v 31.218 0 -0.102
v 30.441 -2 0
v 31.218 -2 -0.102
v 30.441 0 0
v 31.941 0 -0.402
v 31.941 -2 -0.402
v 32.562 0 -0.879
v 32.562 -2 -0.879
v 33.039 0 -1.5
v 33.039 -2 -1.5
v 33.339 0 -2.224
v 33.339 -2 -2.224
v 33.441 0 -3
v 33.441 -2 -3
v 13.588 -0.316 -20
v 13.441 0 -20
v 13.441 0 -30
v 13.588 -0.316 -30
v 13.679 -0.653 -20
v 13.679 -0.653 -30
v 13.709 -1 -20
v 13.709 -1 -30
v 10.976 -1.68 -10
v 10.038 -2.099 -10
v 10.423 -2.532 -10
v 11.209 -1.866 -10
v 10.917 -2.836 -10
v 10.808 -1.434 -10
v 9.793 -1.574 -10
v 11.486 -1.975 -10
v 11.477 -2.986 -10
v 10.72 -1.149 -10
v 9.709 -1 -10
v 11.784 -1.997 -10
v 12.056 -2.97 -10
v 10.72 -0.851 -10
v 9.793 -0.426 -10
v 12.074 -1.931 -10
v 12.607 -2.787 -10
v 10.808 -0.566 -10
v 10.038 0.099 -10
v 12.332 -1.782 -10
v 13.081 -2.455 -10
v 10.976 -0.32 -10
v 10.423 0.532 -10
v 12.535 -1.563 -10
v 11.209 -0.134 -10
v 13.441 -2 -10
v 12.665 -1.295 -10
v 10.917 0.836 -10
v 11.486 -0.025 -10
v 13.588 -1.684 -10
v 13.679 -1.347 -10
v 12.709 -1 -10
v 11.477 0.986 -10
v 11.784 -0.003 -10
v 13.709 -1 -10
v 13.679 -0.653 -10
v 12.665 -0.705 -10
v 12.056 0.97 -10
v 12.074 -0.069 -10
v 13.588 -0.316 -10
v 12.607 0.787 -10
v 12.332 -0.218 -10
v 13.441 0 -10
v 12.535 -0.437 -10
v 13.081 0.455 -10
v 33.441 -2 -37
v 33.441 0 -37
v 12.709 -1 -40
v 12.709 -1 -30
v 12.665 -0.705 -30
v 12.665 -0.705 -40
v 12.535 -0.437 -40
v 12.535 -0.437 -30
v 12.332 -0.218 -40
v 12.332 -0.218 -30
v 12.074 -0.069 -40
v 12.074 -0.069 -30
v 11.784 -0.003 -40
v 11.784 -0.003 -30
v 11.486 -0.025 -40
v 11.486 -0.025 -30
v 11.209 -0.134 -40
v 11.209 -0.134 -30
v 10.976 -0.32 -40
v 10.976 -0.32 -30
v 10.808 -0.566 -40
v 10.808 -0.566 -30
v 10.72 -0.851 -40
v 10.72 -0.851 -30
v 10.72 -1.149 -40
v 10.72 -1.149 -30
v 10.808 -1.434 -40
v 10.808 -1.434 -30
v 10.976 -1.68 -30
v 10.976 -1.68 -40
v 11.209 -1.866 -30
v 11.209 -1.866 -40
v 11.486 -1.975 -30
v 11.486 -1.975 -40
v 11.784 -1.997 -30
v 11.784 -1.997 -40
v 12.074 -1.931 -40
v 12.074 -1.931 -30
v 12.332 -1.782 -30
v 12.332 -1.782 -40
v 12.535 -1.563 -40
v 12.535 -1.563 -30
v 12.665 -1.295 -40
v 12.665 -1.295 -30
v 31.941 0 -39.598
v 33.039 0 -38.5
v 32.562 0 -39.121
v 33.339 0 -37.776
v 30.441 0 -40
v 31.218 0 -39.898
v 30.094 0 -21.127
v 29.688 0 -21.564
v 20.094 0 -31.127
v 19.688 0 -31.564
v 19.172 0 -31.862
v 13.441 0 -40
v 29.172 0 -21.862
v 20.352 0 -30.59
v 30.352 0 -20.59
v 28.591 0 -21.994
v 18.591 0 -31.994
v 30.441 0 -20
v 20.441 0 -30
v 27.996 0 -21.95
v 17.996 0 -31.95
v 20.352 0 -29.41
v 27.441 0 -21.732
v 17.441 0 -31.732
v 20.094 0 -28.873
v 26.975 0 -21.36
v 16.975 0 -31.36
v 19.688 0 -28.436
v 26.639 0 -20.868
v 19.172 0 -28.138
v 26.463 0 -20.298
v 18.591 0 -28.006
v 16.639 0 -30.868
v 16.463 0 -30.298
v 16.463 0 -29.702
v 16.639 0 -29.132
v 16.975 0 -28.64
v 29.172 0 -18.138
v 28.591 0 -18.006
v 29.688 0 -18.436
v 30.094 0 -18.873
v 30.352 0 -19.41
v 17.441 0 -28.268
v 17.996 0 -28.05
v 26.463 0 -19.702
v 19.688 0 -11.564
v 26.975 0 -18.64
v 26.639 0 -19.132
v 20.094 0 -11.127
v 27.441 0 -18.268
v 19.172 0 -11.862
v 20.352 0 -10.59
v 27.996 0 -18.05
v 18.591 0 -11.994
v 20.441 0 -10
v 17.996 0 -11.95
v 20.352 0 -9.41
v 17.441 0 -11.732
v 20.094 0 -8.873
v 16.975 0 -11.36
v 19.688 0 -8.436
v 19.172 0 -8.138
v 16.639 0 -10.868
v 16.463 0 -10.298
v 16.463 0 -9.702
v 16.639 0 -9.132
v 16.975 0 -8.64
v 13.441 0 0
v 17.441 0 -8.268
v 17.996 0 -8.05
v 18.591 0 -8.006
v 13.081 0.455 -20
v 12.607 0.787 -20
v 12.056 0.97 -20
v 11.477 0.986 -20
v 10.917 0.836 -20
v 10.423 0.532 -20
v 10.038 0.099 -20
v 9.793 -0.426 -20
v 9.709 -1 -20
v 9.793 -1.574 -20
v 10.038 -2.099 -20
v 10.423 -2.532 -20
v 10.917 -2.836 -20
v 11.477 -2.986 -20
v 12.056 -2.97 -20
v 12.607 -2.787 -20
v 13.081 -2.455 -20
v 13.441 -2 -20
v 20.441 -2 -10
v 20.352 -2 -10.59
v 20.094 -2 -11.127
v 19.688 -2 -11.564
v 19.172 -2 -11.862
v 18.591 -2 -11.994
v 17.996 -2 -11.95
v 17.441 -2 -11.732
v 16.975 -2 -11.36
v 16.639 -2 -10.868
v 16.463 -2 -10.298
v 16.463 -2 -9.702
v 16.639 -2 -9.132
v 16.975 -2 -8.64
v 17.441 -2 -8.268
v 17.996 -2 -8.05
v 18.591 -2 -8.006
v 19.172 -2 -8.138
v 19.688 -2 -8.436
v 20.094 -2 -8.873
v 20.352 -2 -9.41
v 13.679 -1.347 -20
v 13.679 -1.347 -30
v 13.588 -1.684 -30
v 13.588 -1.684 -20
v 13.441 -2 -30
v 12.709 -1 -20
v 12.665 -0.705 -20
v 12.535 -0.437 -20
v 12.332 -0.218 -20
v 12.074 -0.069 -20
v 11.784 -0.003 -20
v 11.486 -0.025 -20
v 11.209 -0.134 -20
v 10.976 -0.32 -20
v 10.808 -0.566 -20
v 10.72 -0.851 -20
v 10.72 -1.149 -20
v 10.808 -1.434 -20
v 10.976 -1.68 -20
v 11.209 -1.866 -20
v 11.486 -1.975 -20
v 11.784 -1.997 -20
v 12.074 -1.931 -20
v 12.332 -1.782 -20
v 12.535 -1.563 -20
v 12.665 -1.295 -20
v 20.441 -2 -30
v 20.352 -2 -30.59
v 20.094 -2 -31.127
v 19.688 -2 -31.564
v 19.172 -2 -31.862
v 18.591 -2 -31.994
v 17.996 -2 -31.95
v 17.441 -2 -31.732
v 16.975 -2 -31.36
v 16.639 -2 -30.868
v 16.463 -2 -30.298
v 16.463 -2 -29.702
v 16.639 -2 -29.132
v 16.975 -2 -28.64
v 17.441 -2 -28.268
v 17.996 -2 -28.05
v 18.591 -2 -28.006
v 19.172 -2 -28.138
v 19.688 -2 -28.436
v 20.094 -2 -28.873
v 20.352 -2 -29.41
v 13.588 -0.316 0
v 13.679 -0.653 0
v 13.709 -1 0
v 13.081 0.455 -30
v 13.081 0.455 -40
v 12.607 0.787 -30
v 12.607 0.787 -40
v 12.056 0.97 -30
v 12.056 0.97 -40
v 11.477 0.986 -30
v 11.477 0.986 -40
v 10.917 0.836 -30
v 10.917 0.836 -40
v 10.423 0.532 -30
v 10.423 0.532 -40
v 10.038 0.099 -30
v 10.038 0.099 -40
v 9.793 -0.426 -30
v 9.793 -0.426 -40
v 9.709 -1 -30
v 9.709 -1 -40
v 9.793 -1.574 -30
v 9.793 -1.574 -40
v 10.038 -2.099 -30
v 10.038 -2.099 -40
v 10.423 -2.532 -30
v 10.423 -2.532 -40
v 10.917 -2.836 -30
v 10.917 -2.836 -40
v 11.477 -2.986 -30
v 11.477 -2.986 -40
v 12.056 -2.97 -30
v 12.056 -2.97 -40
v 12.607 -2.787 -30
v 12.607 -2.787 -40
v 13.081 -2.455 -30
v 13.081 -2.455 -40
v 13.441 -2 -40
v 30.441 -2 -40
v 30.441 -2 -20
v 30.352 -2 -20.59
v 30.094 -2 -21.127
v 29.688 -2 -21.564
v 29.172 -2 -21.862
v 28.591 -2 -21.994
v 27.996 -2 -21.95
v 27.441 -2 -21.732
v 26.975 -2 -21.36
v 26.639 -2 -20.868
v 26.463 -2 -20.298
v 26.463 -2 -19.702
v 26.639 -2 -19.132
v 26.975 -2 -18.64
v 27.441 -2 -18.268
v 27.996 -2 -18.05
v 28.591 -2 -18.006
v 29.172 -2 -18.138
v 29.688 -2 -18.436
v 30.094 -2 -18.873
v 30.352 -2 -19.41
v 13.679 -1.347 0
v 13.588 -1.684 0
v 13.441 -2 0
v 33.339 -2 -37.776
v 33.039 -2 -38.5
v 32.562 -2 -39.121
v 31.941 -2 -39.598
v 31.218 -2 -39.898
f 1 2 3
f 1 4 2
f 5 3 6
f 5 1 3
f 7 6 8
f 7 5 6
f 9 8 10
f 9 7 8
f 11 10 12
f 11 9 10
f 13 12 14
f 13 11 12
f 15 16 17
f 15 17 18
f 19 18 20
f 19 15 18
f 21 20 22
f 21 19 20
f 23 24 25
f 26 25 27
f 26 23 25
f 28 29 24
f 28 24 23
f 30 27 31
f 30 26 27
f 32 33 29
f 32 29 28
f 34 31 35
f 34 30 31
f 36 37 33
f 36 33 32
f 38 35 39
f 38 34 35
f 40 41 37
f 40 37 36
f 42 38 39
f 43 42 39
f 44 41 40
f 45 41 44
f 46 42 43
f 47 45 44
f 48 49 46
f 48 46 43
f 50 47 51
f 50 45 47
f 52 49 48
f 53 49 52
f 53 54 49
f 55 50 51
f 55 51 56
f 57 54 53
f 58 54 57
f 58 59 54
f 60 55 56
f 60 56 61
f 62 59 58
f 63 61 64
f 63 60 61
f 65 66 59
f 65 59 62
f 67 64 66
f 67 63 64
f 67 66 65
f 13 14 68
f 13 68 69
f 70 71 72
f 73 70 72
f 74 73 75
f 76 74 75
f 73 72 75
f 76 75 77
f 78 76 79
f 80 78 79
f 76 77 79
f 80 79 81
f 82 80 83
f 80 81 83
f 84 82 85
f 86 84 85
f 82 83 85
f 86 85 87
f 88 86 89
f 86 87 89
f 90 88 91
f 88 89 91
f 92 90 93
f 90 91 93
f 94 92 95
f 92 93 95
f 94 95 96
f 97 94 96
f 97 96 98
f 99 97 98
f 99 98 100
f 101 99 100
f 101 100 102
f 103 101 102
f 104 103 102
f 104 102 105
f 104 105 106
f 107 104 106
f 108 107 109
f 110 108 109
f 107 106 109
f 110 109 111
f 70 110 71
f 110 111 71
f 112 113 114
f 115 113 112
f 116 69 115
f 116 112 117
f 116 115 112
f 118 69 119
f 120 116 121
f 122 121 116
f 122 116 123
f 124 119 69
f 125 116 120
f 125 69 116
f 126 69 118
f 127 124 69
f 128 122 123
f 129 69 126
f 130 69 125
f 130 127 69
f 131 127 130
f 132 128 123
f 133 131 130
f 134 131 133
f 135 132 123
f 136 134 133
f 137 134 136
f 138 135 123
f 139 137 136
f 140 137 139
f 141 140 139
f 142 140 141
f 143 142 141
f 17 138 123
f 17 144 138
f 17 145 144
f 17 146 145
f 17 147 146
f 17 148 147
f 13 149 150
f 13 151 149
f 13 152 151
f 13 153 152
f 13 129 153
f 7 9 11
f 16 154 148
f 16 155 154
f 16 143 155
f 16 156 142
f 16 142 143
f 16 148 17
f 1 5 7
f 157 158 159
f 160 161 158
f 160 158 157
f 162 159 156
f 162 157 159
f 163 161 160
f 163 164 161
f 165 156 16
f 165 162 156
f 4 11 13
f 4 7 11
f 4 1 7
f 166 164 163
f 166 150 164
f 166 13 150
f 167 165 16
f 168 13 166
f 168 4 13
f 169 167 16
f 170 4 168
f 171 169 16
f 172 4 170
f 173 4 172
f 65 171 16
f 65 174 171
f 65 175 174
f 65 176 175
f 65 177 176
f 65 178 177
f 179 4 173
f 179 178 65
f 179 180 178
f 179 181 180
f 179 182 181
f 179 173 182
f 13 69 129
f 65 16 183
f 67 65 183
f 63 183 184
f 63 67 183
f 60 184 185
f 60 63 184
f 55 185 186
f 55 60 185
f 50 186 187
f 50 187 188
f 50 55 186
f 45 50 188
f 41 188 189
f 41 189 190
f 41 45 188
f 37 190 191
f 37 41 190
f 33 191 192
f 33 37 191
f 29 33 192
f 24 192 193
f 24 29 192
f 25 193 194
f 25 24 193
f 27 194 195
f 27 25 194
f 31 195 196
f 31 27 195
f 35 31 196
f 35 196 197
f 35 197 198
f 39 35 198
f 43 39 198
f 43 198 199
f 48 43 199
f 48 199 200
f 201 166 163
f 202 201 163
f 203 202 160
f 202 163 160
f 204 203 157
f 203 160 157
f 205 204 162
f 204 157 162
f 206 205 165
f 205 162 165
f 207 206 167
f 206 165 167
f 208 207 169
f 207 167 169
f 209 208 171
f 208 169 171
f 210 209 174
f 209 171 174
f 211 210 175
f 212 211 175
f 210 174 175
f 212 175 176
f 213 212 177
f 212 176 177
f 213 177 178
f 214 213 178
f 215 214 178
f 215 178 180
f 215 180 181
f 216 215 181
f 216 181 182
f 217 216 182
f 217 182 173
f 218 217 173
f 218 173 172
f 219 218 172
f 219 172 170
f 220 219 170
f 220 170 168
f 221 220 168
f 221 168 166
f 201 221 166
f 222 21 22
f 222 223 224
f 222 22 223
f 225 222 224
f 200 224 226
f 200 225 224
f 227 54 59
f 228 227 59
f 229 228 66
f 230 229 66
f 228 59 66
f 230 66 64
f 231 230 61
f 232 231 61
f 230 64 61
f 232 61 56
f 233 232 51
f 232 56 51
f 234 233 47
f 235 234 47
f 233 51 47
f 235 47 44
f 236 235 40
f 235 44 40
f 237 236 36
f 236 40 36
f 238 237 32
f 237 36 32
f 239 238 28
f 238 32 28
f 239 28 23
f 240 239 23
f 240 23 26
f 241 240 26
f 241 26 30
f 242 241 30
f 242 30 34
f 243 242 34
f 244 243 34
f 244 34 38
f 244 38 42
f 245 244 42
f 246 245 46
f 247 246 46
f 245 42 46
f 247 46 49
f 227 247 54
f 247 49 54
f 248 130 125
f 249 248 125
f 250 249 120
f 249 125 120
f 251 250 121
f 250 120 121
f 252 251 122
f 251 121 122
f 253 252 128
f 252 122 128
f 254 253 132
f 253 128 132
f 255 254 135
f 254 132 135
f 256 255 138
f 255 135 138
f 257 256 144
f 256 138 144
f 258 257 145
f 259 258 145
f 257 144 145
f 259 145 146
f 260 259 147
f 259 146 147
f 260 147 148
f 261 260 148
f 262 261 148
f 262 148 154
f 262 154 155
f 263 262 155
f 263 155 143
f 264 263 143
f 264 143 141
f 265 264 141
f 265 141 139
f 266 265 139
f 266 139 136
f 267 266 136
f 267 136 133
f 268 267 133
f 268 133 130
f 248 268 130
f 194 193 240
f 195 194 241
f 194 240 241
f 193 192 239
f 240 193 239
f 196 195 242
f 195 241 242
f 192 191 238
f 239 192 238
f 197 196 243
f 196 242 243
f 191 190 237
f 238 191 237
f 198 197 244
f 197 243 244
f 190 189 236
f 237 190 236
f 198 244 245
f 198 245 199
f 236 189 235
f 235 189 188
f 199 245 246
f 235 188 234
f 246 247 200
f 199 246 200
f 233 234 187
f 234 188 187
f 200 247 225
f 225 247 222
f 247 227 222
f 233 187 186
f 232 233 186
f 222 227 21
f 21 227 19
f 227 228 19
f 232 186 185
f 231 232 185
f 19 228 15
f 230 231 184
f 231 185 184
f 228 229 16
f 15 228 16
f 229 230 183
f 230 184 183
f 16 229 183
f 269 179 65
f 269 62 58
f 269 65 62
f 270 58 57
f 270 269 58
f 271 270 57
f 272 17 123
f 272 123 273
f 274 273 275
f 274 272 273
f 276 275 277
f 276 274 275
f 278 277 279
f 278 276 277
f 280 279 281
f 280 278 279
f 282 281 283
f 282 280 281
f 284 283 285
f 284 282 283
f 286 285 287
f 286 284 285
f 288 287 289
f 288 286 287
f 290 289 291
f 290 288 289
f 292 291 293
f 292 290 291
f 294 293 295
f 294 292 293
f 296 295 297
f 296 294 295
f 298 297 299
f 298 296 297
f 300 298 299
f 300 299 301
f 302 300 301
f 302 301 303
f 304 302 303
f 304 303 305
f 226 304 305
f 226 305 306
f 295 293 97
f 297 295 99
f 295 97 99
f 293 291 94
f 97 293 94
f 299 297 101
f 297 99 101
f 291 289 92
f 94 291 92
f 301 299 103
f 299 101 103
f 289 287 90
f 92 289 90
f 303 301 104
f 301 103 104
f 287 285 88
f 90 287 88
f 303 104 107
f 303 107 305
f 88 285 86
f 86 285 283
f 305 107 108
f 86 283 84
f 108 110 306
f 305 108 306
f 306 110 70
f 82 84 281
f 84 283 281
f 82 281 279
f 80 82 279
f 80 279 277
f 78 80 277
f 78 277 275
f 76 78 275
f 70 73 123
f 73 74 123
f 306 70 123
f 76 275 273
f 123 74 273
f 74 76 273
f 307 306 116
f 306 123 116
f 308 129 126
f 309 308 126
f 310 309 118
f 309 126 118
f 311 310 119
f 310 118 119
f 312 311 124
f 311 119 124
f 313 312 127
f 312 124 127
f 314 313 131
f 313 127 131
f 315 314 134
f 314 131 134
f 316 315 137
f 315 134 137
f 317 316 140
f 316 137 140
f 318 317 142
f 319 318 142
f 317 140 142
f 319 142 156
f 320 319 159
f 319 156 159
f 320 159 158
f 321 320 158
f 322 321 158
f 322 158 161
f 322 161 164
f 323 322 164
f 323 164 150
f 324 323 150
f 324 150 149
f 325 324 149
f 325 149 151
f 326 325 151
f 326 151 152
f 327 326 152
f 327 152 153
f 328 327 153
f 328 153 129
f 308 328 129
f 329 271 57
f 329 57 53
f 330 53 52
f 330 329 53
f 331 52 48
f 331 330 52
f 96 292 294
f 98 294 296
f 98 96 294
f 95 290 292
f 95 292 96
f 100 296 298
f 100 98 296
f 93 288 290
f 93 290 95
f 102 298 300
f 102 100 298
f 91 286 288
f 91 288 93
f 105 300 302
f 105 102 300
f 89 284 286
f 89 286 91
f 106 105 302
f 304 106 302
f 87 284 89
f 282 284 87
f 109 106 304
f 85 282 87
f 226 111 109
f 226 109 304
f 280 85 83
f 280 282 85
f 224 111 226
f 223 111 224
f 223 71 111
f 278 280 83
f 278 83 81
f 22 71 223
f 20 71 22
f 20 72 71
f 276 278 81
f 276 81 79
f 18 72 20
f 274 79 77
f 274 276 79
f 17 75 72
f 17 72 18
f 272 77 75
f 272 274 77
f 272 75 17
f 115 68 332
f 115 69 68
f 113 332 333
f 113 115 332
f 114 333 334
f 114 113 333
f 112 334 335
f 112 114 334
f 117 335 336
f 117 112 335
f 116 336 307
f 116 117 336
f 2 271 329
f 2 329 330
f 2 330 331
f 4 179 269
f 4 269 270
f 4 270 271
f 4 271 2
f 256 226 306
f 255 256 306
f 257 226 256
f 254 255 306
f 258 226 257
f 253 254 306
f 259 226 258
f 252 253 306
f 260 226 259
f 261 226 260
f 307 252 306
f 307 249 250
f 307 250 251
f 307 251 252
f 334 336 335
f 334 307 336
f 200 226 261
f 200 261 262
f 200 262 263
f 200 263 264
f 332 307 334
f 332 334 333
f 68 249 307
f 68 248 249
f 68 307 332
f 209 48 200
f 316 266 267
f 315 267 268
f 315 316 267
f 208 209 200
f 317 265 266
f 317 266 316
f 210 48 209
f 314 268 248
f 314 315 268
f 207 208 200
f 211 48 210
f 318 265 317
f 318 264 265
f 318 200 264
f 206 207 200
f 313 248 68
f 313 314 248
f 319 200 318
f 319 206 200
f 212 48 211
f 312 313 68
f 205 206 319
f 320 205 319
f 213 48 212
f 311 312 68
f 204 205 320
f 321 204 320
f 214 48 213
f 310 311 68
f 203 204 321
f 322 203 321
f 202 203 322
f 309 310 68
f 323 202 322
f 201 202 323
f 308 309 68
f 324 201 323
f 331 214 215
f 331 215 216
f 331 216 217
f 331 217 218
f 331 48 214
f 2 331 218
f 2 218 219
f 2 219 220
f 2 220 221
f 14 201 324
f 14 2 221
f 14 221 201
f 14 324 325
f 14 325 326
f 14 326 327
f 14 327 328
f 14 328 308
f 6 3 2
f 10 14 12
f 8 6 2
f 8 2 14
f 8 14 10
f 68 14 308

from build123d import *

# Parameters (mm, degrees)
BOSS_EXTRUDE1_DEPTH = 40
BOSS_EXTRUDE2_START = -10
SKETCH1_3_R         = 1
BOSS_EXTRUDE2_DEPTH = 10
BOSS_EXTRUDE3_START = -30
SKETCH1_4_R         = 1
BOSS_EXTRUDE3_DEPTH = 10
SKETCH2_R           = 2
CUT_EXTRUDE1_DEPTH  = 10
FILLET1_R           = 3
FILLET2_R           = 3


with BuildPart() as part:
    # Sketch1 → Boss-Extrude1 (new body)
    with BuildSketch(Plane.XY):
        with BuildLine():
            Line((33.441058941, -2), (33.441058941, 0))
            Line((33.441058941, 0), (13.441058941, 0))
            ThreePointArc((13.441058941, 0), (13.640859786, -0.48236191), (13.709008133, -1))
            ThreePointArc((13.709008133, -1), (13.640859786, -1.51763809), (13.441058941, -2))
            Line((13.441058941, -2), (33.441058941, -2))
        make_face()
    extrude(amount=-BOSS_EXTRUDE1_DEPTH)

    # Sketch1<3> → Boss-Extrude2 (add)
    with BuildSketch(Plane.XY.offset(BOSS_EXTRUDE2_START)):
        with BuildLine():
            ThreePointArc((13.709008133, -1), (13.640859786, -0.48236191), (13.441058941, 0))
            ThreePointArc((13.441058941, 0), (9.709008133, -1), (13.441058941, -2))
            ThreePointArc((13.441058941, -2), (13.640859786, -1.51763809), (13.709008133, -1))
        make_face()
        with Locations((11.709008133, -1)):
            Circle(SKETCH1_3_R, mode=Mode.SUBTRACT)
    extrude(amount=-BOSS_EXTRUDE2_DEPTH)

    # Sketch1<4> → Boss-Extrude3 (add)
    with BuildSketch(Plane.XY.offset(BOSS_EXTRUDE3_START)):
        with BuildLine():
            ThreePointArc((13.709008133, -1), (13.640859786, -0.48236191), (13.441058941, 0))
            ThreePointArc((13.441058941, 0), (9.709008133, -1), (13.441058941, -2))
            ThreePointArc((13.441058941, -2), (13.640859786, -1.51763809), (13.709008133, -1))
        make_face()
        with Locations((11.709008133, -1)):
            Circle(SKETCH1_4_R, mode=Mode.SUBTRACT)
    extrude(amount=-BOSS_EXTRUDE3_DEPTH)

    # Sketch2 → Cut-Extrude1 (cut)
    with BuildSketch(Plane(origin=(0, 0, 0), x_dir=(1, 0, 0), z_dir=(0, 1, 0))):
        with Locations((18.441058941, 30)):
            Circle(SKETCH2_R)
        with Locations((18.441058941, 10)):
            Circle(SKETCH2_R)
        with Locations((28.441058941, 20)):
            Circle(SKETCH2_R)
    extrude(amount=-CUT_EXTRUDE1_DEPTH, mode=Mode.SUBTRACT)

    # Fillet1
    fillet1_edges = [part.edges().sort_by_distance(p)[0] for p in [
        (33.441058941, -1, 0),
    ]]
    fillet(fillet1_edges, radius=FILLET1_R)

    # Fillet2
    fillet2_edges = [part.edges().sort_by_distance(p)[0] for p in [
        (33.441058941, -1, -40),
    ]]
    fillet(fillet2_edges, radius=FILLET2_R)


solid = part.part
